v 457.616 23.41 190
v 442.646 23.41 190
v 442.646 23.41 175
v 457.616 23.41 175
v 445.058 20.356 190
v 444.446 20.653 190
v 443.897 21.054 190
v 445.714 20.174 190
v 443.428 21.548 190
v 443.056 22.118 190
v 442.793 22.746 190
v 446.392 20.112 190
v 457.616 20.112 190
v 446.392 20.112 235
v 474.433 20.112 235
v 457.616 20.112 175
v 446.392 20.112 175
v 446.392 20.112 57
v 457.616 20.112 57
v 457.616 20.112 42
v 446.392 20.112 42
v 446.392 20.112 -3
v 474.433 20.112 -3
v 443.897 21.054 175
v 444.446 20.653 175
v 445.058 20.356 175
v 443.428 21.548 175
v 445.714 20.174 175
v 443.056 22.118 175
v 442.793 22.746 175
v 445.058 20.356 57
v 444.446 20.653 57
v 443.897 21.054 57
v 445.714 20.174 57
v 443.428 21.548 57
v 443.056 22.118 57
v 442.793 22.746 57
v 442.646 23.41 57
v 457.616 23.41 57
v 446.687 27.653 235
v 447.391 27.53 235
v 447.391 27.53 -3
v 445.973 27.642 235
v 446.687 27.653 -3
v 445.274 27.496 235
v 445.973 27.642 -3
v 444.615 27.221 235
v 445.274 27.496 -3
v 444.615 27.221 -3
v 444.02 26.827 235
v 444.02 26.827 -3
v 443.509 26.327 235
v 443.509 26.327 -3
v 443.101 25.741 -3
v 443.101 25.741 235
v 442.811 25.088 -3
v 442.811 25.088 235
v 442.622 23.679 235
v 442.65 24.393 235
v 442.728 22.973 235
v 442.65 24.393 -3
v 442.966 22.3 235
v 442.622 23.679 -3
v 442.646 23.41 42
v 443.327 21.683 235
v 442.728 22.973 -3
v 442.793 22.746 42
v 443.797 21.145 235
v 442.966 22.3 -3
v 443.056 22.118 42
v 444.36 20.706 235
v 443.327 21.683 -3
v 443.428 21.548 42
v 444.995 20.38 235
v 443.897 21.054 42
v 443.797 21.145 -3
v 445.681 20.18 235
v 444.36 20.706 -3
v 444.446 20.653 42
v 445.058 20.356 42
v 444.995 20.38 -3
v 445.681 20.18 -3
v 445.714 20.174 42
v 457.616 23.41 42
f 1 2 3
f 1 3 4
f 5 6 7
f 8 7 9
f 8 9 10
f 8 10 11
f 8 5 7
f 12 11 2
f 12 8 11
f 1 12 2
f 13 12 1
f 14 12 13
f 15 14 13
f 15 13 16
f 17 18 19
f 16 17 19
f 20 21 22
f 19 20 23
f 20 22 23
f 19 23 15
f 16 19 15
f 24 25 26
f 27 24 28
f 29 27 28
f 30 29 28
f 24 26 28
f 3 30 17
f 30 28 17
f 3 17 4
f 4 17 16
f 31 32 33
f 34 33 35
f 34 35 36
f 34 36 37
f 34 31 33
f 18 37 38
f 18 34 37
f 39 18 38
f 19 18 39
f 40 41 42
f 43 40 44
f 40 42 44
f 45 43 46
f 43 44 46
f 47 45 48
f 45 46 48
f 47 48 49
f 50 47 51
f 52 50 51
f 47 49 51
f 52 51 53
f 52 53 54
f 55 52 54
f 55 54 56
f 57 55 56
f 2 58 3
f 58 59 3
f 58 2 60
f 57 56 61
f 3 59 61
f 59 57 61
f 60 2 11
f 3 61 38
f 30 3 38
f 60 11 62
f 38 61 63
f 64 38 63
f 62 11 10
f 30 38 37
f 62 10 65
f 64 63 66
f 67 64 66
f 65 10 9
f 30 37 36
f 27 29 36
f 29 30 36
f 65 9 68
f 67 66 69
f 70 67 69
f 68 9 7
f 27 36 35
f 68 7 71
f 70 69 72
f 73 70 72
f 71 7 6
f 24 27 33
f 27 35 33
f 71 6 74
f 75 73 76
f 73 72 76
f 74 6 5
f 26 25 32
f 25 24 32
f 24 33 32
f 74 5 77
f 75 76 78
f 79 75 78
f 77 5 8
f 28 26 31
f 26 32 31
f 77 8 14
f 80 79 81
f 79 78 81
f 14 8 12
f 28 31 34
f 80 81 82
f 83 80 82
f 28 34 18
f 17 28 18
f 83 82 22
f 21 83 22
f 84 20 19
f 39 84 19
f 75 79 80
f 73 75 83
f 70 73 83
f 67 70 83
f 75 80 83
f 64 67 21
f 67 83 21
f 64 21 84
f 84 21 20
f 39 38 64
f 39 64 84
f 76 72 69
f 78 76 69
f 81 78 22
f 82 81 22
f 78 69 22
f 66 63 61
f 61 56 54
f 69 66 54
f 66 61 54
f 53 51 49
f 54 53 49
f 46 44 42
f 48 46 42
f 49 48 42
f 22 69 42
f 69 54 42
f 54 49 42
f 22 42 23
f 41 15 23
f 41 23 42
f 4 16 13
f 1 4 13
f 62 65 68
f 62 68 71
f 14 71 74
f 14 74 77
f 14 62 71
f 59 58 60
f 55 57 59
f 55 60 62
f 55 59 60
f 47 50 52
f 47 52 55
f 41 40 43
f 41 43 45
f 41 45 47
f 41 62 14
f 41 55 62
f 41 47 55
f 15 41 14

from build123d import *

# Parameters (mm, degrees)
BOSS_EXTRUDE1_DEPTH = 238
SKETCH3_W           = 15
SKETCH3_H           = 15
CUT_EXTRUDE1_DEPTH  = 54


with BuildPart() as part:
    # Sketch2 → Boss-Extrude1 (new body)
    with BuildSketch(Plane.XY.offset(-3)):
        with BuildLine():
            Line((446.391965645, 20.11245238), (474.43313548, 20.11245238))
            Line((474.43313548, 20.11245238), (447.390900992, 27.530319971))
            ThreePointArc((447.390900992, 27.530319971), (442.649552271, 24.39262378), (446.391965645, 20.11245238))
        make_face()
    extrude(amount=BOSS_EXTRUDE1_DEPTH)

    # Sketch3 → Cut-Extrude1 (cut)
    with BuildSketch(Plane.XZ.offset(30.589717262)):
        with Locations((450.115770482, 182.5)):
            Rectangle(SKETCH3_W, SKETCH3_H)
        with Locations((450.115770482, 49.5)):
            Rectangle(SKETCH3_W, SKETCH3_H)
    extrude(amount=-CUT_EXTRUDE1_DEPTH, mode=Mode.SUBTRACT)


solid = part.part
